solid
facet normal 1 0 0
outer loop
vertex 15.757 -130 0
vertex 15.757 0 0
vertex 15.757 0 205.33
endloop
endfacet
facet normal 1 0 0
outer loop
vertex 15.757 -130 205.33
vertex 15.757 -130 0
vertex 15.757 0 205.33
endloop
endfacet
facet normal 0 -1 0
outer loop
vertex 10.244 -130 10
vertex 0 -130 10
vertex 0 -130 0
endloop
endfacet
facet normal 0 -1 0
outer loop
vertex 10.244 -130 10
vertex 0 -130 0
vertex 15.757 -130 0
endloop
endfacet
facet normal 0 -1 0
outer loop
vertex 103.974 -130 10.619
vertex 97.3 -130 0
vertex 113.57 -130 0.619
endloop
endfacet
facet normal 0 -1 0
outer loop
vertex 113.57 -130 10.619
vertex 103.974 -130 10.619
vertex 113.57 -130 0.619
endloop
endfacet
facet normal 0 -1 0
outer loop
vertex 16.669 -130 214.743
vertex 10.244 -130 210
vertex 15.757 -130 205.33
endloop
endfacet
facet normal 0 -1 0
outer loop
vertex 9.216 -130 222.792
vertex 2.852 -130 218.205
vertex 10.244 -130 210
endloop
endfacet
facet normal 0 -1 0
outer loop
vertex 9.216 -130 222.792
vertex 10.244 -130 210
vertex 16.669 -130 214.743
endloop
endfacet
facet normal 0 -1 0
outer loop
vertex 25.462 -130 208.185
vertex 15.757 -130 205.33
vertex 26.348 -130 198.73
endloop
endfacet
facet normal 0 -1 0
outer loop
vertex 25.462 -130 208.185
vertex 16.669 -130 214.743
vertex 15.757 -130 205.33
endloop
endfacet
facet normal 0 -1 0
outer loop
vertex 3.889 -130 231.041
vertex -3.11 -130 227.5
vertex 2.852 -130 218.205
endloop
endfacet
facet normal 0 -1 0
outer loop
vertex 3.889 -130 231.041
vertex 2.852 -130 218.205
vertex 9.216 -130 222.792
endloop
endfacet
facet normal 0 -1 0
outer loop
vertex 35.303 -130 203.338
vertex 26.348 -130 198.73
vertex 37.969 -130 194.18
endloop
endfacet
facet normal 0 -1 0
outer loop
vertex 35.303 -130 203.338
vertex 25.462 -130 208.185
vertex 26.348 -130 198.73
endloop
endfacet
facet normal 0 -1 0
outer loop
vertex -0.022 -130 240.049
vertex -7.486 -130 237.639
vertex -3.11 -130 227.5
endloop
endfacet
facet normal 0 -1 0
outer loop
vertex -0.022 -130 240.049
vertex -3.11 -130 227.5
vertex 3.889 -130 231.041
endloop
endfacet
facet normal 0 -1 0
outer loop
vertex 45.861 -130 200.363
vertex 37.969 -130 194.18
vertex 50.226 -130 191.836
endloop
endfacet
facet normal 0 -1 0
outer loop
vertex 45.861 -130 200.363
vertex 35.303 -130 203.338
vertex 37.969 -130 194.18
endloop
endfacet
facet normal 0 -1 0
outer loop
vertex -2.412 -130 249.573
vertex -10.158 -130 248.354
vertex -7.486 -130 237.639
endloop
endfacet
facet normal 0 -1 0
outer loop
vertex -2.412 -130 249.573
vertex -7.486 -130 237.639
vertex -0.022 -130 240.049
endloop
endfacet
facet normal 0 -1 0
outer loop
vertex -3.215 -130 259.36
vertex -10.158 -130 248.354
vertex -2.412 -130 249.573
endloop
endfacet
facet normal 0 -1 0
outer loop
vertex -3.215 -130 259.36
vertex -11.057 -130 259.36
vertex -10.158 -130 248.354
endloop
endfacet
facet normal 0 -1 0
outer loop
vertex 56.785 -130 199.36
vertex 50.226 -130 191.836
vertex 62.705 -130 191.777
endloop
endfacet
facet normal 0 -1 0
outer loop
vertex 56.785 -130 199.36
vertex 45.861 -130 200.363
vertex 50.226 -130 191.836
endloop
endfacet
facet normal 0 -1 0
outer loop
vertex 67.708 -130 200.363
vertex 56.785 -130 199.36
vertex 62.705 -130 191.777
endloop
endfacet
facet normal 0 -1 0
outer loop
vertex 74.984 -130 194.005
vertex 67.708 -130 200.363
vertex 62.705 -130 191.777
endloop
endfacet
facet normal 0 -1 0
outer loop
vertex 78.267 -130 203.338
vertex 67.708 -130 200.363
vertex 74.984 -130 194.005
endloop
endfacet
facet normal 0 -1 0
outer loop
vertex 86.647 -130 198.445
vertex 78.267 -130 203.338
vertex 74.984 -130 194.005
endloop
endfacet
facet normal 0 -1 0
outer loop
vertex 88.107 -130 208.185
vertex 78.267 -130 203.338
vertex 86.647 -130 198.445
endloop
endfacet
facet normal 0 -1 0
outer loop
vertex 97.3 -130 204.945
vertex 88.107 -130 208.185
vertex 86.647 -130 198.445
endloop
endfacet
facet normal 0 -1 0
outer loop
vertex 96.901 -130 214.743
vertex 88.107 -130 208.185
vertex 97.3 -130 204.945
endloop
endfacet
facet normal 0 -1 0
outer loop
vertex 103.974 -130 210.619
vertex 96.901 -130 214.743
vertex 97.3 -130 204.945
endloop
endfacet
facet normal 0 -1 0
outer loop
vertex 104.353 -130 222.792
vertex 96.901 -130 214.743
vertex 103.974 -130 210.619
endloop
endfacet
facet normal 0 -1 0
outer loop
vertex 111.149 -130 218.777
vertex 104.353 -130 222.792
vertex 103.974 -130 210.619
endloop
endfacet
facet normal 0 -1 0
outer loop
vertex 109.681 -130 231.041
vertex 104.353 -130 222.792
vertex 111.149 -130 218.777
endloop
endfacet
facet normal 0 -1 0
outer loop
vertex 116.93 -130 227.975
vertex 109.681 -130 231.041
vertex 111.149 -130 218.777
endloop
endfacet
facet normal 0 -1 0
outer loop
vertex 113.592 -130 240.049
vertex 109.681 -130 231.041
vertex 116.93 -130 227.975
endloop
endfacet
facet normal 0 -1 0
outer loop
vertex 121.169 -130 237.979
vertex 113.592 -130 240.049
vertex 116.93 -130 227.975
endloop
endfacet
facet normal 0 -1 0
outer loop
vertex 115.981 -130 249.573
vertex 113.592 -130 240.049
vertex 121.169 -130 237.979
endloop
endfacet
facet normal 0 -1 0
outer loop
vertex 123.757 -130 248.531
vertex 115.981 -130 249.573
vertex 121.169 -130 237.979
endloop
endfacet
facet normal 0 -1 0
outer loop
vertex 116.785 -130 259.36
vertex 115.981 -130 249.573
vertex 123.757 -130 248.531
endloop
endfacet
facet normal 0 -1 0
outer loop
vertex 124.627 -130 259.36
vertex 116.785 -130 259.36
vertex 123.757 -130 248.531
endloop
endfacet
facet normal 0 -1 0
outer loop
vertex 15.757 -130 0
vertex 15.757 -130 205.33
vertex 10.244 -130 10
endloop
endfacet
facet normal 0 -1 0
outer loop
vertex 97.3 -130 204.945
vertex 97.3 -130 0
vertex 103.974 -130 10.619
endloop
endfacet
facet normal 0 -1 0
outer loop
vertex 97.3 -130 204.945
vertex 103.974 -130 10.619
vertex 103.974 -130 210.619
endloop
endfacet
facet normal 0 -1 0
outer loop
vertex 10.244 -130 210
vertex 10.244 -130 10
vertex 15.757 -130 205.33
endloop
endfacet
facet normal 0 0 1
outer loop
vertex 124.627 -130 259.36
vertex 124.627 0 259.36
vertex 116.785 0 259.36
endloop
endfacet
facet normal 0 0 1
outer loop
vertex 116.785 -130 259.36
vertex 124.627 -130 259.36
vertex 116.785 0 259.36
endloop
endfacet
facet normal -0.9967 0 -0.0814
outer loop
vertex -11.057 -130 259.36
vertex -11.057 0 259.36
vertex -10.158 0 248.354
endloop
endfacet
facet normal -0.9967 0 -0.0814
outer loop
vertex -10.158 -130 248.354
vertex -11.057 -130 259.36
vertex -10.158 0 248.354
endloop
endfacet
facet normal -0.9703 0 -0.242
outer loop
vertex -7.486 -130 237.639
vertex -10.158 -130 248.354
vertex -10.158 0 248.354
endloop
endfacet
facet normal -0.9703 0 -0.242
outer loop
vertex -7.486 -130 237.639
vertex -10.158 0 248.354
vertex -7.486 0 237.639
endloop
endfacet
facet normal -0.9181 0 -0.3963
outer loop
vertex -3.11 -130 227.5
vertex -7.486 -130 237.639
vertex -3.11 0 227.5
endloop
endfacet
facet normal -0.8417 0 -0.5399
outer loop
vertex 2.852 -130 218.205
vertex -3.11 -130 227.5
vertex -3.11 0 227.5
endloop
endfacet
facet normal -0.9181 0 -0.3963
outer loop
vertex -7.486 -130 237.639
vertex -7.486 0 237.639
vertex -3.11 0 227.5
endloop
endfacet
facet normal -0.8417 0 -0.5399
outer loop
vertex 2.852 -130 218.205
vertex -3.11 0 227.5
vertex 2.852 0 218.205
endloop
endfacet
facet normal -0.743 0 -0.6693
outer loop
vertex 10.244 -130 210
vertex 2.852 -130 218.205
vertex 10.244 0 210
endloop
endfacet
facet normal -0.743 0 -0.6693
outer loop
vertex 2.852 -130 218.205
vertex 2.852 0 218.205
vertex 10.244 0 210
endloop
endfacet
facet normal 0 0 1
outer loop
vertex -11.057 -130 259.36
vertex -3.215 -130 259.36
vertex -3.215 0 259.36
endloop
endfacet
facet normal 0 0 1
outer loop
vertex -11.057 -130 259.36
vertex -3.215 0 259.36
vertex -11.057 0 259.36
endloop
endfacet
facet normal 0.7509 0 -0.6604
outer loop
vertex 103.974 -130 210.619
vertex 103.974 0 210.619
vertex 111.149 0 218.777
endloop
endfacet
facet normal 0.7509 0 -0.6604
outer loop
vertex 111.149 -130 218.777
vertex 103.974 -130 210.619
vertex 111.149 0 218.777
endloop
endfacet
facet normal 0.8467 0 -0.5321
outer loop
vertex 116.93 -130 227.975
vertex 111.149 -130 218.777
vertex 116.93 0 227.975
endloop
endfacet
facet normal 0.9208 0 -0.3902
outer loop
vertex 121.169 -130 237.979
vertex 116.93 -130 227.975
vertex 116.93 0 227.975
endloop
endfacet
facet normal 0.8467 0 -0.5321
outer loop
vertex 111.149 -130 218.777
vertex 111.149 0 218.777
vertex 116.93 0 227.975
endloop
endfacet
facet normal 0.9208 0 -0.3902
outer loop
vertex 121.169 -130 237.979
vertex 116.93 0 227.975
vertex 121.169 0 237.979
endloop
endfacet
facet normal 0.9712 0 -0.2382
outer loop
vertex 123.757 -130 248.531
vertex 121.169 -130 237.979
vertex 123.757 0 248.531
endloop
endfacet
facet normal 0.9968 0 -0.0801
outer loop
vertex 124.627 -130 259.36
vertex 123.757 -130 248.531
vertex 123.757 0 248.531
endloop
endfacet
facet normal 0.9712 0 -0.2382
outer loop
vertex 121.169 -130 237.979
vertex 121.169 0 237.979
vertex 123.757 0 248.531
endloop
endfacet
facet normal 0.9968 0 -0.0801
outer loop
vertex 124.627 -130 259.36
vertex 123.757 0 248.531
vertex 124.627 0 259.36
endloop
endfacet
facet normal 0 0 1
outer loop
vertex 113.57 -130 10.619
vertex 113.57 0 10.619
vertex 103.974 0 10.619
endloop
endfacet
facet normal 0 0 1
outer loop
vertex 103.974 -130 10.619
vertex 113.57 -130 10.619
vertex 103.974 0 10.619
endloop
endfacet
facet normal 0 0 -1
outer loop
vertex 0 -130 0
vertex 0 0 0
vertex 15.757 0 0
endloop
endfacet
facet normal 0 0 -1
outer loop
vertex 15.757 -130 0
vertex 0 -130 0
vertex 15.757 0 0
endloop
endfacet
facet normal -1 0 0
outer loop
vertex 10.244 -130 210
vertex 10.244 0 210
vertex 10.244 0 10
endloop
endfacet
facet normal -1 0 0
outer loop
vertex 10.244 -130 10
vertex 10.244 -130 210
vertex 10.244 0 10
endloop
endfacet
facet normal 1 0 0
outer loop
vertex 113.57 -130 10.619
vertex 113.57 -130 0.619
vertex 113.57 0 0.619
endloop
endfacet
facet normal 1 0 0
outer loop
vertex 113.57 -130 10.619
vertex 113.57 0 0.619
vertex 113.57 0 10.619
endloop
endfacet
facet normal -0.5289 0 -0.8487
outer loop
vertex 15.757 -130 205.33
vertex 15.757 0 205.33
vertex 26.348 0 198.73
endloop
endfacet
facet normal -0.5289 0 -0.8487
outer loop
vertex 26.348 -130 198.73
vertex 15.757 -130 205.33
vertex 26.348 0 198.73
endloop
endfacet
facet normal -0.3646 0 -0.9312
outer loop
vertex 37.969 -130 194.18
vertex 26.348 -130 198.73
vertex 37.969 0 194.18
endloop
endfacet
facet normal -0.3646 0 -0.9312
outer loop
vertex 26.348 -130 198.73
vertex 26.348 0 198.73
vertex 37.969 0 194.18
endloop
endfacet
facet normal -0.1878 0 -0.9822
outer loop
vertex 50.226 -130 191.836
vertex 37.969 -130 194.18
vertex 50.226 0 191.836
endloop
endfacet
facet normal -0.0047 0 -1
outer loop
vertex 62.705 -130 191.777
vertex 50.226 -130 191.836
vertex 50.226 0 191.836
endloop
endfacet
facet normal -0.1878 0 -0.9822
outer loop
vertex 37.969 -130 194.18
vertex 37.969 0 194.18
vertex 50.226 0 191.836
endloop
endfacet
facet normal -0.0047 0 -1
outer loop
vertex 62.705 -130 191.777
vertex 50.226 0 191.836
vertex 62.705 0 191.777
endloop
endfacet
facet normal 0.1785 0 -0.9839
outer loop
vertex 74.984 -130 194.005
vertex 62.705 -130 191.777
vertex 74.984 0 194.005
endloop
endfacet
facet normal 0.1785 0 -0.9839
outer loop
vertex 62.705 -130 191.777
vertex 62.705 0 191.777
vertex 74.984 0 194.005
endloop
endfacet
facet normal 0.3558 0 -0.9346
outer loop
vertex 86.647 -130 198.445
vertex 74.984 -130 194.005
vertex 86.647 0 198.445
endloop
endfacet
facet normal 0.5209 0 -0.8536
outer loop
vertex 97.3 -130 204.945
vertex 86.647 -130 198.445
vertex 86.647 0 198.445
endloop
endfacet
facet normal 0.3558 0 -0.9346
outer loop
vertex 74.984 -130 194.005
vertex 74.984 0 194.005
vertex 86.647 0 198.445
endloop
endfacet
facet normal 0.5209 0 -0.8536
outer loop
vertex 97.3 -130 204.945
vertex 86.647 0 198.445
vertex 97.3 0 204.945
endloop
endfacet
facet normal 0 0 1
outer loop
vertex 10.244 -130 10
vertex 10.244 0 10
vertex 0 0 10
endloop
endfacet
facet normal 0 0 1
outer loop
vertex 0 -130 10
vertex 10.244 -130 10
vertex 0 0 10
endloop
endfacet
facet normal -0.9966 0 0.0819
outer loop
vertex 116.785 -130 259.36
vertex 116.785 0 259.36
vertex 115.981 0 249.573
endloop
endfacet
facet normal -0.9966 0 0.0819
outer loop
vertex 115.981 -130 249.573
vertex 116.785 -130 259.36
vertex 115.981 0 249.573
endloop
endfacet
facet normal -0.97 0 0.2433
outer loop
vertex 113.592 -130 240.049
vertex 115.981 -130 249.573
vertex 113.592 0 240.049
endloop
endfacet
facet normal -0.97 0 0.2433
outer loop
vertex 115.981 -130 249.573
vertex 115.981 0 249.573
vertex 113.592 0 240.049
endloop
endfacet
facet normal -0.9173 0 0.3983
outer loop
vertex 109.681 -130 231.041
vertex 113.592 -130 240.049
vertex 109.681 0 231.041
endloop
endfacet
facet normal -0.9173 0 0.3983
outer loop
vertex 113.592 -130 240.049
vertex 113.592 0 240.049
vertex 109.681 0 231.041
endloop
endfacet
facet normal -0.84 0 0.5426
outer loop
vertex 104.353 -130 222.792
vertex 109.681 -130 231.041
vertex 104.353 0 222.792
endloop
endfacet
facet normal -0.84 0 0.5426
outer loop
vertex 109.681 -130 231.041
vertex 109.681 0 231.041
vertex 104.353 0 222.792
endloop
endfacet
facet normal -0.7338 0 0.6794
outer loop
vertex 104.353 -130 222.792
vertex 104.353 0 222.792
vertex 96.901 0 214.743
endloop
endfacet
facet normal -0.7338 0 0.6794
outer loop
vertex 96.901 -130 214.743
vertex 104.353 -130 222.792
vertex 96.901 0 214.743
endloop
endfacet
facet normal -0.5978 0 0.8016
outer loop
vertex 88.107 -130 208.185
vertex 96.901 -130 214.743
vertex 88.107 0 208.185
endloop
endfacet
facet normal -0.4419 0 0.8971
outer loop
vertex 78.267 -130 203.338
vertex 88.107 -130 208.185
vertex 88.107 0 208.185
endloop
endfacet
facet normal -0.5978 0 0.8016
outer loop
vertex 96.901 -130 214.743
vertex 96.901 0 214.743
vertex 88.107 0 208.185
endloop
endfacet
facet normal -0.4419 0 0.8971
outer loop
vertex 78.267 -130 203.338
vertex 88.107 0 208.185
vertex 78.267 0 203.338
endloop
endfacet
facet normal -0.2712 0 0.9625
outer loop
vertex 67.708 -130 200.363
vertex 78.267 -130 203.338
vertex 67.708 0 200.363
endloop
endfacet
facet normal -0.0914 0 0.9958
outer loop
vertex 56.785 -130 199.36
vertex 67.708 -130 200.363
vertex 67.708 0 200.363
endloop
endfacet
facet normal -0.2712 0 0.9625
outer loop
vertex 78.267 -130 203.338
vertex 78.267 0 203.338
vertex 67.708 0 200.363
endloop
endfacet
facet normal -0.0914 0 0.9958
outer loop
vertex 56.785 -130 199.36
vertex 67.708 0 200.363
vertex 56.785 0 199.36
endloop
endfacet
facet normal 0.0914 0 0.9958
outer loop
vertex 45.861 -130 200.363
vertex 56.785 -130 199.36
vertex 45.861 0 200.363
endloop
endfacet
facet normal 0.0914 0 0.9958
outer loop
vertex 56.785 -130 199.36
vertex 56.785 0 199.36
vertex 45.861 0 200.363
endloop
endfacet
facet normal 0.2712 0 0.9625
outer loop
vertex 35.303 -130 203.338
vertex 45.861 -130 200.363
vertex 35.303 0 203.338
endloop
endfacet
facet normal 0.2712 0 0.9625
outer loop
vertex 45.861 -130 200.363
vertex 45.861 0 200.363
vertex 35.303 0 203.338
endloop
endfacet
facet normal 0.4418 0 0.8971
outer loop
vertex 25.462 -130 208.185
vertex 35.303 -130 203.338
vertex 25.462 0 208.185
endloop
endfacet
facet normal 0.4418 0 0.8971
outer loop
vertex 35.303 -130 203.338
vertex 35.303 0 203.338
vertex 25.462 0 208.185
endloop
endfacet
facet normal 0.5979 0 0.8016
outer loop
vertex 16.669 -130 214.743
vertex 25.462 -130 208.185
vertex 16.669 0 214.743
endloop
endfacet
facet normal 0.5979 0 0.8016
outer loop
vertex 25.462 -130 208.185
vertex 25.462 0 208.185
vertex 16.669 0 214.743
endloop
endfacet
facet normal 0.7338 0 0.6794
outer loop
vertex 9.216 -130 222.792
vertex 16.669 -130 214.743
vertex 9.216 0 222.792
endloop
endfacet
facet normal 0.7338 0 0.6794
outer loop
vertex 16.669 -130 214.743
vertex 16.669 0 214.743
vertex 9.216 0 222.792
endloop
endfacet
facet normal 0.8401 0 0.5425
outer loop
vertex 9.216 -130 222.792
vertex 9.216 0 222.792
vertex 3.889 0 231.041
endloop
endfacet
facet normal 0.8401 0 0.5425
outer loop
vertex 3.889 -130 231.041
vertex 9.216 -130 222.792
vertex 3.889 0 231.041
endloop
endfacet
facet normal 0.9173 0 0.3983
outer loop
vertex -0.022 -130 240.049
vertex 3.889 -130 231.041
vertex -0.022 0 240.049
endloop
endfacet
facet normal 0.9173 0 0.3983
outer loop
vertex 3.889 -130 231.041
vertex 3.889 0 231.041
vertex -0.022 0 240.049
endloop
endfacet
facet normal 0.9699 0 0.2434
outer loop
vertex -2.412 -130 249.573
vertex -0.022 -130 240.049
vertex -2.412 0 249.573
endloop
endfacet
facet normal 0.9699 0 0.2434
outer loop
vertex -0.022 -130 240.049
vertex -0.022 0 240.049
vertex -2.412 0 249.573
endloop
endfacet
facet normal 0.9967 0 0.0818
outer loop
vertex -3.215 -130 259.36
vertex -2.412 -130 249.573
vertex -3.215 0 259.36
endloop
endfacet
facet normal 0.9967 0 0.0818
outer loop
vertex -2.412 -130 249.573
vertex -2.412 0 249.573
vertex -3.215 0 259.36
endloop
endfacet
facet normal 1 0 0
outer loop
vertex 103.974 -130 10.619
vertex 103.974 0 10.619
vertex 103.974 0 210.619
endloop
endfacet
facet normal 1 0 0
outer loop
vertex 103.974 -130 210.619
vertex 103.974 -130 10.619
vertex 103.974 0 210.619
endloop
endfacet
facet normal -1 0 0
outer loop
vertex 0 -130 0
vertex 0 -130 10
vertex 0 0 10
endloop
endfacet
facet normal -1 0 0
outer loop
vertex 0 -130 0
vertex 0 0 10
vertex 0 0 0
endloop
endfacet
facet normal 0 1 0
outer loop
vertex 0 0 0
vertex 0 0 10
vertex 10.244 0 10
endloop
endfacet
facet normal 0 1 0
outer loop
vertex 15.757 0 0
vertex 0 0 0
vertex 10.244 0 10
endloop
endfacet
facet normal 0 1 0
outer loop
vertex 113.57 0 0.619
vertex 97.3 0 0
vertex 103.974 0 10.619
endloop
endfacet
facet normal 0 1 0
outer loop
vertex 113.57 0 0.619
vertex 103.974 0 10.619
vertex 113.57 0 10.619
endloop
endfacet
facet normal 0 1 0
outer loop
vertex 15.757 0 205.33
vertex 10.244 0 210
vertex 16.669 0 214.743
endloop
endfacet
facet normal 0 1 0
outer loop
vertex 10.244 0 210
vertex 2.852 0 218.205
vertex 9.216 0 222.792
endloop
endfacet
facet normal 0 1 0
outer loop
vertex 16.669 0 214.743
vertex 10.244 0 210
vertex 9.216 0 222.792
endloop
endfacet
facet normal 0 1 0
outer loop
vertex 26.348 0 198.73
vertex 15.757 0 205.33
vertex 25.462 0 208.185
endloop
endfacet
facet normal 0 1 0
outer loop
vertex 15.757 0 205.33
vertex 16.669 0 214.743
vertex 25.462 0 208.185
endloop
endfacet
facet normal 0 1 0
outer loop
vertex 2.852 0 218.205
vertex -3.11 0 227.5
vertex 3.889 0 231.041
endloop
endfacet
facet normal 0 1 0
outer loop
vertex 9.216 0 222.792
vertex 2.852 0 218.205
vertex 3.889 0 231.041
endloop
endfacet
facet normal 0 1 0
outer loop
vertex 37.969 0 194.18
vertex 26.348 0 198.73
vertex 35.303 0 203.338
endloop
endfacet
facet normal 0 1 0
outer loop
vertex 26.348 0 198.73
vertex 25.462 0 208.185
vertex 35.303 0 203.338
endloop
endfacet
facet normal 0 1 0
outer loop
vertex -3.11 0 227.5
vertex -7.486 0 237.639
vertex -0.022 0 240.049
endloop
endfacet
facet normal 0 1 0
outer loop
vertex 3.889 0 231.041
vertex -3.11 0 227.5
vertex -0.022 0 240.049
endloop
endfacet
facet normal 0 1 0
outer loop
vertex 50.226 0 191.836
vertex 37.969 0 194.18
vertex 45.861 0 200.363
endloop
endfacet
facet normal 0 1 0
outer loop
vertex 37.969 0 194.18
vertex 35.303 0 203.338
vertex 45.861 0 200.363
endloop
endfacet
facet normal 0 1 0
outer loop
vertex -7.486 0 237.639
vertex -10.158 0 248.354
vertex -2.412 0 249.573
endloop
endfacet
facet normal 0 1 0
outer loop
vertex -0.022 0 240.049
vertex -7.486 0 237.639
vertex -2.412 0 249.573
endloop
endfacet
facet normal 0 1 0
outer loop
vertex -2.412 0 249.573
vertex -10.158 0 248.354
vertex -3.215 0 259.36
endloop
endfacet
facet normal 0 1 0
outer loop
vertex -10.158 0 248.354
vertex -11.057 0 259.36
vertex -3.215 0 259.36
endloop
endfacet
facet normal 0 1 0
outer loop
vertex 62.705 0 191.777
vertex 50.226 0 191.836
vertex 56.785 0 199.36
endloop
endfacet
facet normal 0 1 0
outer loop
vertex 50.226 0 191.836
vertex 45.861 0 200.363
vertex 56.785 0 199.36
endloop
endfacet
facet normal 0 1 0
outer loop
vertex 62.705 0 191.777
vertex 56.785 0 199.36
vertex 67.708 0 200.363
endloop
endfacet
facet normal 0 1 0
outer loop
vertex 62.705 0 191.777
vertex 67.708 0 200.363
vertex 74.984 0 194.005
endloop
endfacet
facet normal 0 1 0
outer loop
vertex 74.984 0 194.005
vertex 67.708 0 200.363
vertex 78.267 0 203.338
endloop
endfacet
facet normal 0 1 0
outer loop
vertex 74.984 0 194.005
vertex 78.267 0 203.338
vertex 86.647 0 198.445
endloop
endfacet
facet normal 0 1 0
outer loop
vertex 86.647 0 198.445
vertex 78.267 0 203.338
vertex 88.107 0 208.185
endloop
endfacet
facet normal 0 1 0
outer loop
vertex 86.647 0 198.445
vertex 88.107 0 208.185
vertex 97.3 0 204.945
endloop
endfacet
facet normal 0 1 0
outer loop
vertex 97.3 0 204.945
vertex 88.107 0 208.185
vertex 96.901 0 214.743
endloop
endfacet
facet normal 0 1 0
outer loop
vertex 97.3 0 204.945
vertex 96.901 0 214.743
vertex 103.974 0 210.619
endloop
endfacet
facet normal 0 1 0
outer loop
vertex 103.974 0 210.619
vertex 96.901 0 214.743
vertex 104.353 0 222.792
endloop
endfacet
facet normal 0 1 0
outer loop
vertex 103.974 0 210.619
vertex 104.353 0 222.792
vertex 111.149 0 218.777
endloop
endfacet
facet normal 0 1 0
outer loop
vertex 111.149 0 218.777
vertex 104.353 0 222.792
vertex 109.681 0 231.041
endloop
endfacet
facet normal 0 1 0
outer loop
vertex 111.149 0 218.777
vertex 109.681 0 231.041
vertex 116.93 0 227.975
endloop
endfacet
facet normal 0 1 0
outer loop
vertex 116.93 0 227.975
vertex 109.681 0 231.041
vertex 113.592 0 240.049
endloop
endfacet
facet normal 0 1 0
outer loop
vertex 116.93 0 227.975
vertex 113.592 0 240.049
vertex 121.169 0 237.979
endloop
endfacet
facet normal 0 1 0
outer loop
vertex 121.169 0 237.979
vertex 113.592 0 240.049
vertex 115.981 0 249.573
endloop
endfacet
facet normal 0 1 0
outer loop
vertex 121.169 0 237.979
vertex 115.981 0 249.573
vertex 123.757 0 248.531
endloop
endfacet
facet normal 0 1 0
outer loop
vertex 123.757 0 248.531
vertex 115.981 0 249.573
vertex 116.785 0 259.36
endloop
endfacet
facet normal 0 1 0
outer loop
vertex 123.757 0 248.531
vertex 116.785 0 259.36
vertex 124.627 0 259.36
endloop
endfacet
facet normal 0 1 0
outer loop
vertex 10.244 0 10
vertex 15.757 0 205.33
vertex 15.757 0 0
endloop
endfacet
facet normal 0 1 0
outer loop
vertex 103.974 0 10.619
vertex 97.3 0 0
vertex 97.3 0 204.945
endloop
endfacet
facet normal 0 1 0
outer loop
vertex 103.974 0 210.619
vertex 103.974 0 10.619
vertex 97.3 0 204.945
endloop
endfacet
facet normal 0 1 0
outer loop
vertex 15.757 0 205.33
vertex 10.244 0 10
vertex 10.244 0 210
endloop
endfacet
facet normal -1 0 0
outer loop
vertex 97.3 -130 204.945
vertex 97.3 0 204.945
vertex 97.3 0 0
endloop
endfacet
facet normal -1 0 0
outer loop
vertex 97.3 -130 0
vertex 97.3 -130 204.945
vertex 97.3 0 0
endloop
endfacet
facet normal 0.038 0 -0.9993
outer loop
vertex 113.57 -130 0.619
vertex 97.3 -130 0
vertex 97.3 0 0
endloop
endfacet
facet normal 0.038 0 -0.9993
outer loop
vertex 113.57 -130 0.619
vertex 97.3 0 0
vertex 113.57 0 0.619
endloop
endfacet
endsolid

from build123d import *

# Parameters (mm, degrees)
F1_DEPTH = 130


with BuildPart() as f1:
    # F0 (on Front) → F1 (new body)
    with BuildSketch(Plane.XZ):
        with BuildLine():
            Line((0, 10), (0, 0))
            Line((0, 0), (15.757065, 0))
            Line((15.757065, 0), (15.757065, 205.330478))
            ThreePointArc((15.757065, 205.330478), (12.938265, 207.591795), (10.243875, 210))
            Line((10.243875, 210), (10.243875, 10))
            Line((10.243875, 10), (0, 10))
        make_face()
        with BuildLine():
            ThreePointArc((10.243875, 210), (12.938265, 207.591795), (15.757065, 205.330478))
            ThreePointArc((15.757065, 205.330478), (56.464246, 191.519328), (97.300157, 204.94508))
            ThreePointArc((97.300157, 204.94508), (100.728563, 207.674159), (103.973635, 210.618874))
            ThreePointArc((103.973635, 210.618874), (119.250429, 232.892095), (124.626733, 259.36042))
            Line((124.626733, 259.36042), (116.784884, 259.36042))
            ThreePointArc((116.784884, 259.36042), (113.592055, 240.048628), (104.353374, 222.792145))
            ThreePointArc((104.353374, 222.792145), (56.784884, 199.36042), (9.216394, 222.792145))
            ThreePointArc((9.216394, 222.792145), (-0.022288, 240.048628), (-3.215116, 259.36042))
            Line((-3.215116, 259.36042), (-11.056966, 259.36042))
            ThreePointArc((-11.056966, 259.36042), (-5.50454, 232.480237), (10.243875, 210))
        make_face()
        with BuildLine():
            ThreePointArc((103.973635, 210.618874), (100.728563, 207.674159), (97.300157, 204.94508))
            Line((97.300157, 204.94508), (97.300157, 0))
            Line((97.300157, 0), (113.569767, 0.618874))
            Line((113.569767, 0.618874), (113.569767, 10.618874))
            Line((113.569767, 10.618874), (103.973635, 10.618874))
            Line((103.973635, 10.618874), (103.973635, 210.618874))
        make_face()
    extrude(amount=F1_DEPTH)


solid = f1.part
